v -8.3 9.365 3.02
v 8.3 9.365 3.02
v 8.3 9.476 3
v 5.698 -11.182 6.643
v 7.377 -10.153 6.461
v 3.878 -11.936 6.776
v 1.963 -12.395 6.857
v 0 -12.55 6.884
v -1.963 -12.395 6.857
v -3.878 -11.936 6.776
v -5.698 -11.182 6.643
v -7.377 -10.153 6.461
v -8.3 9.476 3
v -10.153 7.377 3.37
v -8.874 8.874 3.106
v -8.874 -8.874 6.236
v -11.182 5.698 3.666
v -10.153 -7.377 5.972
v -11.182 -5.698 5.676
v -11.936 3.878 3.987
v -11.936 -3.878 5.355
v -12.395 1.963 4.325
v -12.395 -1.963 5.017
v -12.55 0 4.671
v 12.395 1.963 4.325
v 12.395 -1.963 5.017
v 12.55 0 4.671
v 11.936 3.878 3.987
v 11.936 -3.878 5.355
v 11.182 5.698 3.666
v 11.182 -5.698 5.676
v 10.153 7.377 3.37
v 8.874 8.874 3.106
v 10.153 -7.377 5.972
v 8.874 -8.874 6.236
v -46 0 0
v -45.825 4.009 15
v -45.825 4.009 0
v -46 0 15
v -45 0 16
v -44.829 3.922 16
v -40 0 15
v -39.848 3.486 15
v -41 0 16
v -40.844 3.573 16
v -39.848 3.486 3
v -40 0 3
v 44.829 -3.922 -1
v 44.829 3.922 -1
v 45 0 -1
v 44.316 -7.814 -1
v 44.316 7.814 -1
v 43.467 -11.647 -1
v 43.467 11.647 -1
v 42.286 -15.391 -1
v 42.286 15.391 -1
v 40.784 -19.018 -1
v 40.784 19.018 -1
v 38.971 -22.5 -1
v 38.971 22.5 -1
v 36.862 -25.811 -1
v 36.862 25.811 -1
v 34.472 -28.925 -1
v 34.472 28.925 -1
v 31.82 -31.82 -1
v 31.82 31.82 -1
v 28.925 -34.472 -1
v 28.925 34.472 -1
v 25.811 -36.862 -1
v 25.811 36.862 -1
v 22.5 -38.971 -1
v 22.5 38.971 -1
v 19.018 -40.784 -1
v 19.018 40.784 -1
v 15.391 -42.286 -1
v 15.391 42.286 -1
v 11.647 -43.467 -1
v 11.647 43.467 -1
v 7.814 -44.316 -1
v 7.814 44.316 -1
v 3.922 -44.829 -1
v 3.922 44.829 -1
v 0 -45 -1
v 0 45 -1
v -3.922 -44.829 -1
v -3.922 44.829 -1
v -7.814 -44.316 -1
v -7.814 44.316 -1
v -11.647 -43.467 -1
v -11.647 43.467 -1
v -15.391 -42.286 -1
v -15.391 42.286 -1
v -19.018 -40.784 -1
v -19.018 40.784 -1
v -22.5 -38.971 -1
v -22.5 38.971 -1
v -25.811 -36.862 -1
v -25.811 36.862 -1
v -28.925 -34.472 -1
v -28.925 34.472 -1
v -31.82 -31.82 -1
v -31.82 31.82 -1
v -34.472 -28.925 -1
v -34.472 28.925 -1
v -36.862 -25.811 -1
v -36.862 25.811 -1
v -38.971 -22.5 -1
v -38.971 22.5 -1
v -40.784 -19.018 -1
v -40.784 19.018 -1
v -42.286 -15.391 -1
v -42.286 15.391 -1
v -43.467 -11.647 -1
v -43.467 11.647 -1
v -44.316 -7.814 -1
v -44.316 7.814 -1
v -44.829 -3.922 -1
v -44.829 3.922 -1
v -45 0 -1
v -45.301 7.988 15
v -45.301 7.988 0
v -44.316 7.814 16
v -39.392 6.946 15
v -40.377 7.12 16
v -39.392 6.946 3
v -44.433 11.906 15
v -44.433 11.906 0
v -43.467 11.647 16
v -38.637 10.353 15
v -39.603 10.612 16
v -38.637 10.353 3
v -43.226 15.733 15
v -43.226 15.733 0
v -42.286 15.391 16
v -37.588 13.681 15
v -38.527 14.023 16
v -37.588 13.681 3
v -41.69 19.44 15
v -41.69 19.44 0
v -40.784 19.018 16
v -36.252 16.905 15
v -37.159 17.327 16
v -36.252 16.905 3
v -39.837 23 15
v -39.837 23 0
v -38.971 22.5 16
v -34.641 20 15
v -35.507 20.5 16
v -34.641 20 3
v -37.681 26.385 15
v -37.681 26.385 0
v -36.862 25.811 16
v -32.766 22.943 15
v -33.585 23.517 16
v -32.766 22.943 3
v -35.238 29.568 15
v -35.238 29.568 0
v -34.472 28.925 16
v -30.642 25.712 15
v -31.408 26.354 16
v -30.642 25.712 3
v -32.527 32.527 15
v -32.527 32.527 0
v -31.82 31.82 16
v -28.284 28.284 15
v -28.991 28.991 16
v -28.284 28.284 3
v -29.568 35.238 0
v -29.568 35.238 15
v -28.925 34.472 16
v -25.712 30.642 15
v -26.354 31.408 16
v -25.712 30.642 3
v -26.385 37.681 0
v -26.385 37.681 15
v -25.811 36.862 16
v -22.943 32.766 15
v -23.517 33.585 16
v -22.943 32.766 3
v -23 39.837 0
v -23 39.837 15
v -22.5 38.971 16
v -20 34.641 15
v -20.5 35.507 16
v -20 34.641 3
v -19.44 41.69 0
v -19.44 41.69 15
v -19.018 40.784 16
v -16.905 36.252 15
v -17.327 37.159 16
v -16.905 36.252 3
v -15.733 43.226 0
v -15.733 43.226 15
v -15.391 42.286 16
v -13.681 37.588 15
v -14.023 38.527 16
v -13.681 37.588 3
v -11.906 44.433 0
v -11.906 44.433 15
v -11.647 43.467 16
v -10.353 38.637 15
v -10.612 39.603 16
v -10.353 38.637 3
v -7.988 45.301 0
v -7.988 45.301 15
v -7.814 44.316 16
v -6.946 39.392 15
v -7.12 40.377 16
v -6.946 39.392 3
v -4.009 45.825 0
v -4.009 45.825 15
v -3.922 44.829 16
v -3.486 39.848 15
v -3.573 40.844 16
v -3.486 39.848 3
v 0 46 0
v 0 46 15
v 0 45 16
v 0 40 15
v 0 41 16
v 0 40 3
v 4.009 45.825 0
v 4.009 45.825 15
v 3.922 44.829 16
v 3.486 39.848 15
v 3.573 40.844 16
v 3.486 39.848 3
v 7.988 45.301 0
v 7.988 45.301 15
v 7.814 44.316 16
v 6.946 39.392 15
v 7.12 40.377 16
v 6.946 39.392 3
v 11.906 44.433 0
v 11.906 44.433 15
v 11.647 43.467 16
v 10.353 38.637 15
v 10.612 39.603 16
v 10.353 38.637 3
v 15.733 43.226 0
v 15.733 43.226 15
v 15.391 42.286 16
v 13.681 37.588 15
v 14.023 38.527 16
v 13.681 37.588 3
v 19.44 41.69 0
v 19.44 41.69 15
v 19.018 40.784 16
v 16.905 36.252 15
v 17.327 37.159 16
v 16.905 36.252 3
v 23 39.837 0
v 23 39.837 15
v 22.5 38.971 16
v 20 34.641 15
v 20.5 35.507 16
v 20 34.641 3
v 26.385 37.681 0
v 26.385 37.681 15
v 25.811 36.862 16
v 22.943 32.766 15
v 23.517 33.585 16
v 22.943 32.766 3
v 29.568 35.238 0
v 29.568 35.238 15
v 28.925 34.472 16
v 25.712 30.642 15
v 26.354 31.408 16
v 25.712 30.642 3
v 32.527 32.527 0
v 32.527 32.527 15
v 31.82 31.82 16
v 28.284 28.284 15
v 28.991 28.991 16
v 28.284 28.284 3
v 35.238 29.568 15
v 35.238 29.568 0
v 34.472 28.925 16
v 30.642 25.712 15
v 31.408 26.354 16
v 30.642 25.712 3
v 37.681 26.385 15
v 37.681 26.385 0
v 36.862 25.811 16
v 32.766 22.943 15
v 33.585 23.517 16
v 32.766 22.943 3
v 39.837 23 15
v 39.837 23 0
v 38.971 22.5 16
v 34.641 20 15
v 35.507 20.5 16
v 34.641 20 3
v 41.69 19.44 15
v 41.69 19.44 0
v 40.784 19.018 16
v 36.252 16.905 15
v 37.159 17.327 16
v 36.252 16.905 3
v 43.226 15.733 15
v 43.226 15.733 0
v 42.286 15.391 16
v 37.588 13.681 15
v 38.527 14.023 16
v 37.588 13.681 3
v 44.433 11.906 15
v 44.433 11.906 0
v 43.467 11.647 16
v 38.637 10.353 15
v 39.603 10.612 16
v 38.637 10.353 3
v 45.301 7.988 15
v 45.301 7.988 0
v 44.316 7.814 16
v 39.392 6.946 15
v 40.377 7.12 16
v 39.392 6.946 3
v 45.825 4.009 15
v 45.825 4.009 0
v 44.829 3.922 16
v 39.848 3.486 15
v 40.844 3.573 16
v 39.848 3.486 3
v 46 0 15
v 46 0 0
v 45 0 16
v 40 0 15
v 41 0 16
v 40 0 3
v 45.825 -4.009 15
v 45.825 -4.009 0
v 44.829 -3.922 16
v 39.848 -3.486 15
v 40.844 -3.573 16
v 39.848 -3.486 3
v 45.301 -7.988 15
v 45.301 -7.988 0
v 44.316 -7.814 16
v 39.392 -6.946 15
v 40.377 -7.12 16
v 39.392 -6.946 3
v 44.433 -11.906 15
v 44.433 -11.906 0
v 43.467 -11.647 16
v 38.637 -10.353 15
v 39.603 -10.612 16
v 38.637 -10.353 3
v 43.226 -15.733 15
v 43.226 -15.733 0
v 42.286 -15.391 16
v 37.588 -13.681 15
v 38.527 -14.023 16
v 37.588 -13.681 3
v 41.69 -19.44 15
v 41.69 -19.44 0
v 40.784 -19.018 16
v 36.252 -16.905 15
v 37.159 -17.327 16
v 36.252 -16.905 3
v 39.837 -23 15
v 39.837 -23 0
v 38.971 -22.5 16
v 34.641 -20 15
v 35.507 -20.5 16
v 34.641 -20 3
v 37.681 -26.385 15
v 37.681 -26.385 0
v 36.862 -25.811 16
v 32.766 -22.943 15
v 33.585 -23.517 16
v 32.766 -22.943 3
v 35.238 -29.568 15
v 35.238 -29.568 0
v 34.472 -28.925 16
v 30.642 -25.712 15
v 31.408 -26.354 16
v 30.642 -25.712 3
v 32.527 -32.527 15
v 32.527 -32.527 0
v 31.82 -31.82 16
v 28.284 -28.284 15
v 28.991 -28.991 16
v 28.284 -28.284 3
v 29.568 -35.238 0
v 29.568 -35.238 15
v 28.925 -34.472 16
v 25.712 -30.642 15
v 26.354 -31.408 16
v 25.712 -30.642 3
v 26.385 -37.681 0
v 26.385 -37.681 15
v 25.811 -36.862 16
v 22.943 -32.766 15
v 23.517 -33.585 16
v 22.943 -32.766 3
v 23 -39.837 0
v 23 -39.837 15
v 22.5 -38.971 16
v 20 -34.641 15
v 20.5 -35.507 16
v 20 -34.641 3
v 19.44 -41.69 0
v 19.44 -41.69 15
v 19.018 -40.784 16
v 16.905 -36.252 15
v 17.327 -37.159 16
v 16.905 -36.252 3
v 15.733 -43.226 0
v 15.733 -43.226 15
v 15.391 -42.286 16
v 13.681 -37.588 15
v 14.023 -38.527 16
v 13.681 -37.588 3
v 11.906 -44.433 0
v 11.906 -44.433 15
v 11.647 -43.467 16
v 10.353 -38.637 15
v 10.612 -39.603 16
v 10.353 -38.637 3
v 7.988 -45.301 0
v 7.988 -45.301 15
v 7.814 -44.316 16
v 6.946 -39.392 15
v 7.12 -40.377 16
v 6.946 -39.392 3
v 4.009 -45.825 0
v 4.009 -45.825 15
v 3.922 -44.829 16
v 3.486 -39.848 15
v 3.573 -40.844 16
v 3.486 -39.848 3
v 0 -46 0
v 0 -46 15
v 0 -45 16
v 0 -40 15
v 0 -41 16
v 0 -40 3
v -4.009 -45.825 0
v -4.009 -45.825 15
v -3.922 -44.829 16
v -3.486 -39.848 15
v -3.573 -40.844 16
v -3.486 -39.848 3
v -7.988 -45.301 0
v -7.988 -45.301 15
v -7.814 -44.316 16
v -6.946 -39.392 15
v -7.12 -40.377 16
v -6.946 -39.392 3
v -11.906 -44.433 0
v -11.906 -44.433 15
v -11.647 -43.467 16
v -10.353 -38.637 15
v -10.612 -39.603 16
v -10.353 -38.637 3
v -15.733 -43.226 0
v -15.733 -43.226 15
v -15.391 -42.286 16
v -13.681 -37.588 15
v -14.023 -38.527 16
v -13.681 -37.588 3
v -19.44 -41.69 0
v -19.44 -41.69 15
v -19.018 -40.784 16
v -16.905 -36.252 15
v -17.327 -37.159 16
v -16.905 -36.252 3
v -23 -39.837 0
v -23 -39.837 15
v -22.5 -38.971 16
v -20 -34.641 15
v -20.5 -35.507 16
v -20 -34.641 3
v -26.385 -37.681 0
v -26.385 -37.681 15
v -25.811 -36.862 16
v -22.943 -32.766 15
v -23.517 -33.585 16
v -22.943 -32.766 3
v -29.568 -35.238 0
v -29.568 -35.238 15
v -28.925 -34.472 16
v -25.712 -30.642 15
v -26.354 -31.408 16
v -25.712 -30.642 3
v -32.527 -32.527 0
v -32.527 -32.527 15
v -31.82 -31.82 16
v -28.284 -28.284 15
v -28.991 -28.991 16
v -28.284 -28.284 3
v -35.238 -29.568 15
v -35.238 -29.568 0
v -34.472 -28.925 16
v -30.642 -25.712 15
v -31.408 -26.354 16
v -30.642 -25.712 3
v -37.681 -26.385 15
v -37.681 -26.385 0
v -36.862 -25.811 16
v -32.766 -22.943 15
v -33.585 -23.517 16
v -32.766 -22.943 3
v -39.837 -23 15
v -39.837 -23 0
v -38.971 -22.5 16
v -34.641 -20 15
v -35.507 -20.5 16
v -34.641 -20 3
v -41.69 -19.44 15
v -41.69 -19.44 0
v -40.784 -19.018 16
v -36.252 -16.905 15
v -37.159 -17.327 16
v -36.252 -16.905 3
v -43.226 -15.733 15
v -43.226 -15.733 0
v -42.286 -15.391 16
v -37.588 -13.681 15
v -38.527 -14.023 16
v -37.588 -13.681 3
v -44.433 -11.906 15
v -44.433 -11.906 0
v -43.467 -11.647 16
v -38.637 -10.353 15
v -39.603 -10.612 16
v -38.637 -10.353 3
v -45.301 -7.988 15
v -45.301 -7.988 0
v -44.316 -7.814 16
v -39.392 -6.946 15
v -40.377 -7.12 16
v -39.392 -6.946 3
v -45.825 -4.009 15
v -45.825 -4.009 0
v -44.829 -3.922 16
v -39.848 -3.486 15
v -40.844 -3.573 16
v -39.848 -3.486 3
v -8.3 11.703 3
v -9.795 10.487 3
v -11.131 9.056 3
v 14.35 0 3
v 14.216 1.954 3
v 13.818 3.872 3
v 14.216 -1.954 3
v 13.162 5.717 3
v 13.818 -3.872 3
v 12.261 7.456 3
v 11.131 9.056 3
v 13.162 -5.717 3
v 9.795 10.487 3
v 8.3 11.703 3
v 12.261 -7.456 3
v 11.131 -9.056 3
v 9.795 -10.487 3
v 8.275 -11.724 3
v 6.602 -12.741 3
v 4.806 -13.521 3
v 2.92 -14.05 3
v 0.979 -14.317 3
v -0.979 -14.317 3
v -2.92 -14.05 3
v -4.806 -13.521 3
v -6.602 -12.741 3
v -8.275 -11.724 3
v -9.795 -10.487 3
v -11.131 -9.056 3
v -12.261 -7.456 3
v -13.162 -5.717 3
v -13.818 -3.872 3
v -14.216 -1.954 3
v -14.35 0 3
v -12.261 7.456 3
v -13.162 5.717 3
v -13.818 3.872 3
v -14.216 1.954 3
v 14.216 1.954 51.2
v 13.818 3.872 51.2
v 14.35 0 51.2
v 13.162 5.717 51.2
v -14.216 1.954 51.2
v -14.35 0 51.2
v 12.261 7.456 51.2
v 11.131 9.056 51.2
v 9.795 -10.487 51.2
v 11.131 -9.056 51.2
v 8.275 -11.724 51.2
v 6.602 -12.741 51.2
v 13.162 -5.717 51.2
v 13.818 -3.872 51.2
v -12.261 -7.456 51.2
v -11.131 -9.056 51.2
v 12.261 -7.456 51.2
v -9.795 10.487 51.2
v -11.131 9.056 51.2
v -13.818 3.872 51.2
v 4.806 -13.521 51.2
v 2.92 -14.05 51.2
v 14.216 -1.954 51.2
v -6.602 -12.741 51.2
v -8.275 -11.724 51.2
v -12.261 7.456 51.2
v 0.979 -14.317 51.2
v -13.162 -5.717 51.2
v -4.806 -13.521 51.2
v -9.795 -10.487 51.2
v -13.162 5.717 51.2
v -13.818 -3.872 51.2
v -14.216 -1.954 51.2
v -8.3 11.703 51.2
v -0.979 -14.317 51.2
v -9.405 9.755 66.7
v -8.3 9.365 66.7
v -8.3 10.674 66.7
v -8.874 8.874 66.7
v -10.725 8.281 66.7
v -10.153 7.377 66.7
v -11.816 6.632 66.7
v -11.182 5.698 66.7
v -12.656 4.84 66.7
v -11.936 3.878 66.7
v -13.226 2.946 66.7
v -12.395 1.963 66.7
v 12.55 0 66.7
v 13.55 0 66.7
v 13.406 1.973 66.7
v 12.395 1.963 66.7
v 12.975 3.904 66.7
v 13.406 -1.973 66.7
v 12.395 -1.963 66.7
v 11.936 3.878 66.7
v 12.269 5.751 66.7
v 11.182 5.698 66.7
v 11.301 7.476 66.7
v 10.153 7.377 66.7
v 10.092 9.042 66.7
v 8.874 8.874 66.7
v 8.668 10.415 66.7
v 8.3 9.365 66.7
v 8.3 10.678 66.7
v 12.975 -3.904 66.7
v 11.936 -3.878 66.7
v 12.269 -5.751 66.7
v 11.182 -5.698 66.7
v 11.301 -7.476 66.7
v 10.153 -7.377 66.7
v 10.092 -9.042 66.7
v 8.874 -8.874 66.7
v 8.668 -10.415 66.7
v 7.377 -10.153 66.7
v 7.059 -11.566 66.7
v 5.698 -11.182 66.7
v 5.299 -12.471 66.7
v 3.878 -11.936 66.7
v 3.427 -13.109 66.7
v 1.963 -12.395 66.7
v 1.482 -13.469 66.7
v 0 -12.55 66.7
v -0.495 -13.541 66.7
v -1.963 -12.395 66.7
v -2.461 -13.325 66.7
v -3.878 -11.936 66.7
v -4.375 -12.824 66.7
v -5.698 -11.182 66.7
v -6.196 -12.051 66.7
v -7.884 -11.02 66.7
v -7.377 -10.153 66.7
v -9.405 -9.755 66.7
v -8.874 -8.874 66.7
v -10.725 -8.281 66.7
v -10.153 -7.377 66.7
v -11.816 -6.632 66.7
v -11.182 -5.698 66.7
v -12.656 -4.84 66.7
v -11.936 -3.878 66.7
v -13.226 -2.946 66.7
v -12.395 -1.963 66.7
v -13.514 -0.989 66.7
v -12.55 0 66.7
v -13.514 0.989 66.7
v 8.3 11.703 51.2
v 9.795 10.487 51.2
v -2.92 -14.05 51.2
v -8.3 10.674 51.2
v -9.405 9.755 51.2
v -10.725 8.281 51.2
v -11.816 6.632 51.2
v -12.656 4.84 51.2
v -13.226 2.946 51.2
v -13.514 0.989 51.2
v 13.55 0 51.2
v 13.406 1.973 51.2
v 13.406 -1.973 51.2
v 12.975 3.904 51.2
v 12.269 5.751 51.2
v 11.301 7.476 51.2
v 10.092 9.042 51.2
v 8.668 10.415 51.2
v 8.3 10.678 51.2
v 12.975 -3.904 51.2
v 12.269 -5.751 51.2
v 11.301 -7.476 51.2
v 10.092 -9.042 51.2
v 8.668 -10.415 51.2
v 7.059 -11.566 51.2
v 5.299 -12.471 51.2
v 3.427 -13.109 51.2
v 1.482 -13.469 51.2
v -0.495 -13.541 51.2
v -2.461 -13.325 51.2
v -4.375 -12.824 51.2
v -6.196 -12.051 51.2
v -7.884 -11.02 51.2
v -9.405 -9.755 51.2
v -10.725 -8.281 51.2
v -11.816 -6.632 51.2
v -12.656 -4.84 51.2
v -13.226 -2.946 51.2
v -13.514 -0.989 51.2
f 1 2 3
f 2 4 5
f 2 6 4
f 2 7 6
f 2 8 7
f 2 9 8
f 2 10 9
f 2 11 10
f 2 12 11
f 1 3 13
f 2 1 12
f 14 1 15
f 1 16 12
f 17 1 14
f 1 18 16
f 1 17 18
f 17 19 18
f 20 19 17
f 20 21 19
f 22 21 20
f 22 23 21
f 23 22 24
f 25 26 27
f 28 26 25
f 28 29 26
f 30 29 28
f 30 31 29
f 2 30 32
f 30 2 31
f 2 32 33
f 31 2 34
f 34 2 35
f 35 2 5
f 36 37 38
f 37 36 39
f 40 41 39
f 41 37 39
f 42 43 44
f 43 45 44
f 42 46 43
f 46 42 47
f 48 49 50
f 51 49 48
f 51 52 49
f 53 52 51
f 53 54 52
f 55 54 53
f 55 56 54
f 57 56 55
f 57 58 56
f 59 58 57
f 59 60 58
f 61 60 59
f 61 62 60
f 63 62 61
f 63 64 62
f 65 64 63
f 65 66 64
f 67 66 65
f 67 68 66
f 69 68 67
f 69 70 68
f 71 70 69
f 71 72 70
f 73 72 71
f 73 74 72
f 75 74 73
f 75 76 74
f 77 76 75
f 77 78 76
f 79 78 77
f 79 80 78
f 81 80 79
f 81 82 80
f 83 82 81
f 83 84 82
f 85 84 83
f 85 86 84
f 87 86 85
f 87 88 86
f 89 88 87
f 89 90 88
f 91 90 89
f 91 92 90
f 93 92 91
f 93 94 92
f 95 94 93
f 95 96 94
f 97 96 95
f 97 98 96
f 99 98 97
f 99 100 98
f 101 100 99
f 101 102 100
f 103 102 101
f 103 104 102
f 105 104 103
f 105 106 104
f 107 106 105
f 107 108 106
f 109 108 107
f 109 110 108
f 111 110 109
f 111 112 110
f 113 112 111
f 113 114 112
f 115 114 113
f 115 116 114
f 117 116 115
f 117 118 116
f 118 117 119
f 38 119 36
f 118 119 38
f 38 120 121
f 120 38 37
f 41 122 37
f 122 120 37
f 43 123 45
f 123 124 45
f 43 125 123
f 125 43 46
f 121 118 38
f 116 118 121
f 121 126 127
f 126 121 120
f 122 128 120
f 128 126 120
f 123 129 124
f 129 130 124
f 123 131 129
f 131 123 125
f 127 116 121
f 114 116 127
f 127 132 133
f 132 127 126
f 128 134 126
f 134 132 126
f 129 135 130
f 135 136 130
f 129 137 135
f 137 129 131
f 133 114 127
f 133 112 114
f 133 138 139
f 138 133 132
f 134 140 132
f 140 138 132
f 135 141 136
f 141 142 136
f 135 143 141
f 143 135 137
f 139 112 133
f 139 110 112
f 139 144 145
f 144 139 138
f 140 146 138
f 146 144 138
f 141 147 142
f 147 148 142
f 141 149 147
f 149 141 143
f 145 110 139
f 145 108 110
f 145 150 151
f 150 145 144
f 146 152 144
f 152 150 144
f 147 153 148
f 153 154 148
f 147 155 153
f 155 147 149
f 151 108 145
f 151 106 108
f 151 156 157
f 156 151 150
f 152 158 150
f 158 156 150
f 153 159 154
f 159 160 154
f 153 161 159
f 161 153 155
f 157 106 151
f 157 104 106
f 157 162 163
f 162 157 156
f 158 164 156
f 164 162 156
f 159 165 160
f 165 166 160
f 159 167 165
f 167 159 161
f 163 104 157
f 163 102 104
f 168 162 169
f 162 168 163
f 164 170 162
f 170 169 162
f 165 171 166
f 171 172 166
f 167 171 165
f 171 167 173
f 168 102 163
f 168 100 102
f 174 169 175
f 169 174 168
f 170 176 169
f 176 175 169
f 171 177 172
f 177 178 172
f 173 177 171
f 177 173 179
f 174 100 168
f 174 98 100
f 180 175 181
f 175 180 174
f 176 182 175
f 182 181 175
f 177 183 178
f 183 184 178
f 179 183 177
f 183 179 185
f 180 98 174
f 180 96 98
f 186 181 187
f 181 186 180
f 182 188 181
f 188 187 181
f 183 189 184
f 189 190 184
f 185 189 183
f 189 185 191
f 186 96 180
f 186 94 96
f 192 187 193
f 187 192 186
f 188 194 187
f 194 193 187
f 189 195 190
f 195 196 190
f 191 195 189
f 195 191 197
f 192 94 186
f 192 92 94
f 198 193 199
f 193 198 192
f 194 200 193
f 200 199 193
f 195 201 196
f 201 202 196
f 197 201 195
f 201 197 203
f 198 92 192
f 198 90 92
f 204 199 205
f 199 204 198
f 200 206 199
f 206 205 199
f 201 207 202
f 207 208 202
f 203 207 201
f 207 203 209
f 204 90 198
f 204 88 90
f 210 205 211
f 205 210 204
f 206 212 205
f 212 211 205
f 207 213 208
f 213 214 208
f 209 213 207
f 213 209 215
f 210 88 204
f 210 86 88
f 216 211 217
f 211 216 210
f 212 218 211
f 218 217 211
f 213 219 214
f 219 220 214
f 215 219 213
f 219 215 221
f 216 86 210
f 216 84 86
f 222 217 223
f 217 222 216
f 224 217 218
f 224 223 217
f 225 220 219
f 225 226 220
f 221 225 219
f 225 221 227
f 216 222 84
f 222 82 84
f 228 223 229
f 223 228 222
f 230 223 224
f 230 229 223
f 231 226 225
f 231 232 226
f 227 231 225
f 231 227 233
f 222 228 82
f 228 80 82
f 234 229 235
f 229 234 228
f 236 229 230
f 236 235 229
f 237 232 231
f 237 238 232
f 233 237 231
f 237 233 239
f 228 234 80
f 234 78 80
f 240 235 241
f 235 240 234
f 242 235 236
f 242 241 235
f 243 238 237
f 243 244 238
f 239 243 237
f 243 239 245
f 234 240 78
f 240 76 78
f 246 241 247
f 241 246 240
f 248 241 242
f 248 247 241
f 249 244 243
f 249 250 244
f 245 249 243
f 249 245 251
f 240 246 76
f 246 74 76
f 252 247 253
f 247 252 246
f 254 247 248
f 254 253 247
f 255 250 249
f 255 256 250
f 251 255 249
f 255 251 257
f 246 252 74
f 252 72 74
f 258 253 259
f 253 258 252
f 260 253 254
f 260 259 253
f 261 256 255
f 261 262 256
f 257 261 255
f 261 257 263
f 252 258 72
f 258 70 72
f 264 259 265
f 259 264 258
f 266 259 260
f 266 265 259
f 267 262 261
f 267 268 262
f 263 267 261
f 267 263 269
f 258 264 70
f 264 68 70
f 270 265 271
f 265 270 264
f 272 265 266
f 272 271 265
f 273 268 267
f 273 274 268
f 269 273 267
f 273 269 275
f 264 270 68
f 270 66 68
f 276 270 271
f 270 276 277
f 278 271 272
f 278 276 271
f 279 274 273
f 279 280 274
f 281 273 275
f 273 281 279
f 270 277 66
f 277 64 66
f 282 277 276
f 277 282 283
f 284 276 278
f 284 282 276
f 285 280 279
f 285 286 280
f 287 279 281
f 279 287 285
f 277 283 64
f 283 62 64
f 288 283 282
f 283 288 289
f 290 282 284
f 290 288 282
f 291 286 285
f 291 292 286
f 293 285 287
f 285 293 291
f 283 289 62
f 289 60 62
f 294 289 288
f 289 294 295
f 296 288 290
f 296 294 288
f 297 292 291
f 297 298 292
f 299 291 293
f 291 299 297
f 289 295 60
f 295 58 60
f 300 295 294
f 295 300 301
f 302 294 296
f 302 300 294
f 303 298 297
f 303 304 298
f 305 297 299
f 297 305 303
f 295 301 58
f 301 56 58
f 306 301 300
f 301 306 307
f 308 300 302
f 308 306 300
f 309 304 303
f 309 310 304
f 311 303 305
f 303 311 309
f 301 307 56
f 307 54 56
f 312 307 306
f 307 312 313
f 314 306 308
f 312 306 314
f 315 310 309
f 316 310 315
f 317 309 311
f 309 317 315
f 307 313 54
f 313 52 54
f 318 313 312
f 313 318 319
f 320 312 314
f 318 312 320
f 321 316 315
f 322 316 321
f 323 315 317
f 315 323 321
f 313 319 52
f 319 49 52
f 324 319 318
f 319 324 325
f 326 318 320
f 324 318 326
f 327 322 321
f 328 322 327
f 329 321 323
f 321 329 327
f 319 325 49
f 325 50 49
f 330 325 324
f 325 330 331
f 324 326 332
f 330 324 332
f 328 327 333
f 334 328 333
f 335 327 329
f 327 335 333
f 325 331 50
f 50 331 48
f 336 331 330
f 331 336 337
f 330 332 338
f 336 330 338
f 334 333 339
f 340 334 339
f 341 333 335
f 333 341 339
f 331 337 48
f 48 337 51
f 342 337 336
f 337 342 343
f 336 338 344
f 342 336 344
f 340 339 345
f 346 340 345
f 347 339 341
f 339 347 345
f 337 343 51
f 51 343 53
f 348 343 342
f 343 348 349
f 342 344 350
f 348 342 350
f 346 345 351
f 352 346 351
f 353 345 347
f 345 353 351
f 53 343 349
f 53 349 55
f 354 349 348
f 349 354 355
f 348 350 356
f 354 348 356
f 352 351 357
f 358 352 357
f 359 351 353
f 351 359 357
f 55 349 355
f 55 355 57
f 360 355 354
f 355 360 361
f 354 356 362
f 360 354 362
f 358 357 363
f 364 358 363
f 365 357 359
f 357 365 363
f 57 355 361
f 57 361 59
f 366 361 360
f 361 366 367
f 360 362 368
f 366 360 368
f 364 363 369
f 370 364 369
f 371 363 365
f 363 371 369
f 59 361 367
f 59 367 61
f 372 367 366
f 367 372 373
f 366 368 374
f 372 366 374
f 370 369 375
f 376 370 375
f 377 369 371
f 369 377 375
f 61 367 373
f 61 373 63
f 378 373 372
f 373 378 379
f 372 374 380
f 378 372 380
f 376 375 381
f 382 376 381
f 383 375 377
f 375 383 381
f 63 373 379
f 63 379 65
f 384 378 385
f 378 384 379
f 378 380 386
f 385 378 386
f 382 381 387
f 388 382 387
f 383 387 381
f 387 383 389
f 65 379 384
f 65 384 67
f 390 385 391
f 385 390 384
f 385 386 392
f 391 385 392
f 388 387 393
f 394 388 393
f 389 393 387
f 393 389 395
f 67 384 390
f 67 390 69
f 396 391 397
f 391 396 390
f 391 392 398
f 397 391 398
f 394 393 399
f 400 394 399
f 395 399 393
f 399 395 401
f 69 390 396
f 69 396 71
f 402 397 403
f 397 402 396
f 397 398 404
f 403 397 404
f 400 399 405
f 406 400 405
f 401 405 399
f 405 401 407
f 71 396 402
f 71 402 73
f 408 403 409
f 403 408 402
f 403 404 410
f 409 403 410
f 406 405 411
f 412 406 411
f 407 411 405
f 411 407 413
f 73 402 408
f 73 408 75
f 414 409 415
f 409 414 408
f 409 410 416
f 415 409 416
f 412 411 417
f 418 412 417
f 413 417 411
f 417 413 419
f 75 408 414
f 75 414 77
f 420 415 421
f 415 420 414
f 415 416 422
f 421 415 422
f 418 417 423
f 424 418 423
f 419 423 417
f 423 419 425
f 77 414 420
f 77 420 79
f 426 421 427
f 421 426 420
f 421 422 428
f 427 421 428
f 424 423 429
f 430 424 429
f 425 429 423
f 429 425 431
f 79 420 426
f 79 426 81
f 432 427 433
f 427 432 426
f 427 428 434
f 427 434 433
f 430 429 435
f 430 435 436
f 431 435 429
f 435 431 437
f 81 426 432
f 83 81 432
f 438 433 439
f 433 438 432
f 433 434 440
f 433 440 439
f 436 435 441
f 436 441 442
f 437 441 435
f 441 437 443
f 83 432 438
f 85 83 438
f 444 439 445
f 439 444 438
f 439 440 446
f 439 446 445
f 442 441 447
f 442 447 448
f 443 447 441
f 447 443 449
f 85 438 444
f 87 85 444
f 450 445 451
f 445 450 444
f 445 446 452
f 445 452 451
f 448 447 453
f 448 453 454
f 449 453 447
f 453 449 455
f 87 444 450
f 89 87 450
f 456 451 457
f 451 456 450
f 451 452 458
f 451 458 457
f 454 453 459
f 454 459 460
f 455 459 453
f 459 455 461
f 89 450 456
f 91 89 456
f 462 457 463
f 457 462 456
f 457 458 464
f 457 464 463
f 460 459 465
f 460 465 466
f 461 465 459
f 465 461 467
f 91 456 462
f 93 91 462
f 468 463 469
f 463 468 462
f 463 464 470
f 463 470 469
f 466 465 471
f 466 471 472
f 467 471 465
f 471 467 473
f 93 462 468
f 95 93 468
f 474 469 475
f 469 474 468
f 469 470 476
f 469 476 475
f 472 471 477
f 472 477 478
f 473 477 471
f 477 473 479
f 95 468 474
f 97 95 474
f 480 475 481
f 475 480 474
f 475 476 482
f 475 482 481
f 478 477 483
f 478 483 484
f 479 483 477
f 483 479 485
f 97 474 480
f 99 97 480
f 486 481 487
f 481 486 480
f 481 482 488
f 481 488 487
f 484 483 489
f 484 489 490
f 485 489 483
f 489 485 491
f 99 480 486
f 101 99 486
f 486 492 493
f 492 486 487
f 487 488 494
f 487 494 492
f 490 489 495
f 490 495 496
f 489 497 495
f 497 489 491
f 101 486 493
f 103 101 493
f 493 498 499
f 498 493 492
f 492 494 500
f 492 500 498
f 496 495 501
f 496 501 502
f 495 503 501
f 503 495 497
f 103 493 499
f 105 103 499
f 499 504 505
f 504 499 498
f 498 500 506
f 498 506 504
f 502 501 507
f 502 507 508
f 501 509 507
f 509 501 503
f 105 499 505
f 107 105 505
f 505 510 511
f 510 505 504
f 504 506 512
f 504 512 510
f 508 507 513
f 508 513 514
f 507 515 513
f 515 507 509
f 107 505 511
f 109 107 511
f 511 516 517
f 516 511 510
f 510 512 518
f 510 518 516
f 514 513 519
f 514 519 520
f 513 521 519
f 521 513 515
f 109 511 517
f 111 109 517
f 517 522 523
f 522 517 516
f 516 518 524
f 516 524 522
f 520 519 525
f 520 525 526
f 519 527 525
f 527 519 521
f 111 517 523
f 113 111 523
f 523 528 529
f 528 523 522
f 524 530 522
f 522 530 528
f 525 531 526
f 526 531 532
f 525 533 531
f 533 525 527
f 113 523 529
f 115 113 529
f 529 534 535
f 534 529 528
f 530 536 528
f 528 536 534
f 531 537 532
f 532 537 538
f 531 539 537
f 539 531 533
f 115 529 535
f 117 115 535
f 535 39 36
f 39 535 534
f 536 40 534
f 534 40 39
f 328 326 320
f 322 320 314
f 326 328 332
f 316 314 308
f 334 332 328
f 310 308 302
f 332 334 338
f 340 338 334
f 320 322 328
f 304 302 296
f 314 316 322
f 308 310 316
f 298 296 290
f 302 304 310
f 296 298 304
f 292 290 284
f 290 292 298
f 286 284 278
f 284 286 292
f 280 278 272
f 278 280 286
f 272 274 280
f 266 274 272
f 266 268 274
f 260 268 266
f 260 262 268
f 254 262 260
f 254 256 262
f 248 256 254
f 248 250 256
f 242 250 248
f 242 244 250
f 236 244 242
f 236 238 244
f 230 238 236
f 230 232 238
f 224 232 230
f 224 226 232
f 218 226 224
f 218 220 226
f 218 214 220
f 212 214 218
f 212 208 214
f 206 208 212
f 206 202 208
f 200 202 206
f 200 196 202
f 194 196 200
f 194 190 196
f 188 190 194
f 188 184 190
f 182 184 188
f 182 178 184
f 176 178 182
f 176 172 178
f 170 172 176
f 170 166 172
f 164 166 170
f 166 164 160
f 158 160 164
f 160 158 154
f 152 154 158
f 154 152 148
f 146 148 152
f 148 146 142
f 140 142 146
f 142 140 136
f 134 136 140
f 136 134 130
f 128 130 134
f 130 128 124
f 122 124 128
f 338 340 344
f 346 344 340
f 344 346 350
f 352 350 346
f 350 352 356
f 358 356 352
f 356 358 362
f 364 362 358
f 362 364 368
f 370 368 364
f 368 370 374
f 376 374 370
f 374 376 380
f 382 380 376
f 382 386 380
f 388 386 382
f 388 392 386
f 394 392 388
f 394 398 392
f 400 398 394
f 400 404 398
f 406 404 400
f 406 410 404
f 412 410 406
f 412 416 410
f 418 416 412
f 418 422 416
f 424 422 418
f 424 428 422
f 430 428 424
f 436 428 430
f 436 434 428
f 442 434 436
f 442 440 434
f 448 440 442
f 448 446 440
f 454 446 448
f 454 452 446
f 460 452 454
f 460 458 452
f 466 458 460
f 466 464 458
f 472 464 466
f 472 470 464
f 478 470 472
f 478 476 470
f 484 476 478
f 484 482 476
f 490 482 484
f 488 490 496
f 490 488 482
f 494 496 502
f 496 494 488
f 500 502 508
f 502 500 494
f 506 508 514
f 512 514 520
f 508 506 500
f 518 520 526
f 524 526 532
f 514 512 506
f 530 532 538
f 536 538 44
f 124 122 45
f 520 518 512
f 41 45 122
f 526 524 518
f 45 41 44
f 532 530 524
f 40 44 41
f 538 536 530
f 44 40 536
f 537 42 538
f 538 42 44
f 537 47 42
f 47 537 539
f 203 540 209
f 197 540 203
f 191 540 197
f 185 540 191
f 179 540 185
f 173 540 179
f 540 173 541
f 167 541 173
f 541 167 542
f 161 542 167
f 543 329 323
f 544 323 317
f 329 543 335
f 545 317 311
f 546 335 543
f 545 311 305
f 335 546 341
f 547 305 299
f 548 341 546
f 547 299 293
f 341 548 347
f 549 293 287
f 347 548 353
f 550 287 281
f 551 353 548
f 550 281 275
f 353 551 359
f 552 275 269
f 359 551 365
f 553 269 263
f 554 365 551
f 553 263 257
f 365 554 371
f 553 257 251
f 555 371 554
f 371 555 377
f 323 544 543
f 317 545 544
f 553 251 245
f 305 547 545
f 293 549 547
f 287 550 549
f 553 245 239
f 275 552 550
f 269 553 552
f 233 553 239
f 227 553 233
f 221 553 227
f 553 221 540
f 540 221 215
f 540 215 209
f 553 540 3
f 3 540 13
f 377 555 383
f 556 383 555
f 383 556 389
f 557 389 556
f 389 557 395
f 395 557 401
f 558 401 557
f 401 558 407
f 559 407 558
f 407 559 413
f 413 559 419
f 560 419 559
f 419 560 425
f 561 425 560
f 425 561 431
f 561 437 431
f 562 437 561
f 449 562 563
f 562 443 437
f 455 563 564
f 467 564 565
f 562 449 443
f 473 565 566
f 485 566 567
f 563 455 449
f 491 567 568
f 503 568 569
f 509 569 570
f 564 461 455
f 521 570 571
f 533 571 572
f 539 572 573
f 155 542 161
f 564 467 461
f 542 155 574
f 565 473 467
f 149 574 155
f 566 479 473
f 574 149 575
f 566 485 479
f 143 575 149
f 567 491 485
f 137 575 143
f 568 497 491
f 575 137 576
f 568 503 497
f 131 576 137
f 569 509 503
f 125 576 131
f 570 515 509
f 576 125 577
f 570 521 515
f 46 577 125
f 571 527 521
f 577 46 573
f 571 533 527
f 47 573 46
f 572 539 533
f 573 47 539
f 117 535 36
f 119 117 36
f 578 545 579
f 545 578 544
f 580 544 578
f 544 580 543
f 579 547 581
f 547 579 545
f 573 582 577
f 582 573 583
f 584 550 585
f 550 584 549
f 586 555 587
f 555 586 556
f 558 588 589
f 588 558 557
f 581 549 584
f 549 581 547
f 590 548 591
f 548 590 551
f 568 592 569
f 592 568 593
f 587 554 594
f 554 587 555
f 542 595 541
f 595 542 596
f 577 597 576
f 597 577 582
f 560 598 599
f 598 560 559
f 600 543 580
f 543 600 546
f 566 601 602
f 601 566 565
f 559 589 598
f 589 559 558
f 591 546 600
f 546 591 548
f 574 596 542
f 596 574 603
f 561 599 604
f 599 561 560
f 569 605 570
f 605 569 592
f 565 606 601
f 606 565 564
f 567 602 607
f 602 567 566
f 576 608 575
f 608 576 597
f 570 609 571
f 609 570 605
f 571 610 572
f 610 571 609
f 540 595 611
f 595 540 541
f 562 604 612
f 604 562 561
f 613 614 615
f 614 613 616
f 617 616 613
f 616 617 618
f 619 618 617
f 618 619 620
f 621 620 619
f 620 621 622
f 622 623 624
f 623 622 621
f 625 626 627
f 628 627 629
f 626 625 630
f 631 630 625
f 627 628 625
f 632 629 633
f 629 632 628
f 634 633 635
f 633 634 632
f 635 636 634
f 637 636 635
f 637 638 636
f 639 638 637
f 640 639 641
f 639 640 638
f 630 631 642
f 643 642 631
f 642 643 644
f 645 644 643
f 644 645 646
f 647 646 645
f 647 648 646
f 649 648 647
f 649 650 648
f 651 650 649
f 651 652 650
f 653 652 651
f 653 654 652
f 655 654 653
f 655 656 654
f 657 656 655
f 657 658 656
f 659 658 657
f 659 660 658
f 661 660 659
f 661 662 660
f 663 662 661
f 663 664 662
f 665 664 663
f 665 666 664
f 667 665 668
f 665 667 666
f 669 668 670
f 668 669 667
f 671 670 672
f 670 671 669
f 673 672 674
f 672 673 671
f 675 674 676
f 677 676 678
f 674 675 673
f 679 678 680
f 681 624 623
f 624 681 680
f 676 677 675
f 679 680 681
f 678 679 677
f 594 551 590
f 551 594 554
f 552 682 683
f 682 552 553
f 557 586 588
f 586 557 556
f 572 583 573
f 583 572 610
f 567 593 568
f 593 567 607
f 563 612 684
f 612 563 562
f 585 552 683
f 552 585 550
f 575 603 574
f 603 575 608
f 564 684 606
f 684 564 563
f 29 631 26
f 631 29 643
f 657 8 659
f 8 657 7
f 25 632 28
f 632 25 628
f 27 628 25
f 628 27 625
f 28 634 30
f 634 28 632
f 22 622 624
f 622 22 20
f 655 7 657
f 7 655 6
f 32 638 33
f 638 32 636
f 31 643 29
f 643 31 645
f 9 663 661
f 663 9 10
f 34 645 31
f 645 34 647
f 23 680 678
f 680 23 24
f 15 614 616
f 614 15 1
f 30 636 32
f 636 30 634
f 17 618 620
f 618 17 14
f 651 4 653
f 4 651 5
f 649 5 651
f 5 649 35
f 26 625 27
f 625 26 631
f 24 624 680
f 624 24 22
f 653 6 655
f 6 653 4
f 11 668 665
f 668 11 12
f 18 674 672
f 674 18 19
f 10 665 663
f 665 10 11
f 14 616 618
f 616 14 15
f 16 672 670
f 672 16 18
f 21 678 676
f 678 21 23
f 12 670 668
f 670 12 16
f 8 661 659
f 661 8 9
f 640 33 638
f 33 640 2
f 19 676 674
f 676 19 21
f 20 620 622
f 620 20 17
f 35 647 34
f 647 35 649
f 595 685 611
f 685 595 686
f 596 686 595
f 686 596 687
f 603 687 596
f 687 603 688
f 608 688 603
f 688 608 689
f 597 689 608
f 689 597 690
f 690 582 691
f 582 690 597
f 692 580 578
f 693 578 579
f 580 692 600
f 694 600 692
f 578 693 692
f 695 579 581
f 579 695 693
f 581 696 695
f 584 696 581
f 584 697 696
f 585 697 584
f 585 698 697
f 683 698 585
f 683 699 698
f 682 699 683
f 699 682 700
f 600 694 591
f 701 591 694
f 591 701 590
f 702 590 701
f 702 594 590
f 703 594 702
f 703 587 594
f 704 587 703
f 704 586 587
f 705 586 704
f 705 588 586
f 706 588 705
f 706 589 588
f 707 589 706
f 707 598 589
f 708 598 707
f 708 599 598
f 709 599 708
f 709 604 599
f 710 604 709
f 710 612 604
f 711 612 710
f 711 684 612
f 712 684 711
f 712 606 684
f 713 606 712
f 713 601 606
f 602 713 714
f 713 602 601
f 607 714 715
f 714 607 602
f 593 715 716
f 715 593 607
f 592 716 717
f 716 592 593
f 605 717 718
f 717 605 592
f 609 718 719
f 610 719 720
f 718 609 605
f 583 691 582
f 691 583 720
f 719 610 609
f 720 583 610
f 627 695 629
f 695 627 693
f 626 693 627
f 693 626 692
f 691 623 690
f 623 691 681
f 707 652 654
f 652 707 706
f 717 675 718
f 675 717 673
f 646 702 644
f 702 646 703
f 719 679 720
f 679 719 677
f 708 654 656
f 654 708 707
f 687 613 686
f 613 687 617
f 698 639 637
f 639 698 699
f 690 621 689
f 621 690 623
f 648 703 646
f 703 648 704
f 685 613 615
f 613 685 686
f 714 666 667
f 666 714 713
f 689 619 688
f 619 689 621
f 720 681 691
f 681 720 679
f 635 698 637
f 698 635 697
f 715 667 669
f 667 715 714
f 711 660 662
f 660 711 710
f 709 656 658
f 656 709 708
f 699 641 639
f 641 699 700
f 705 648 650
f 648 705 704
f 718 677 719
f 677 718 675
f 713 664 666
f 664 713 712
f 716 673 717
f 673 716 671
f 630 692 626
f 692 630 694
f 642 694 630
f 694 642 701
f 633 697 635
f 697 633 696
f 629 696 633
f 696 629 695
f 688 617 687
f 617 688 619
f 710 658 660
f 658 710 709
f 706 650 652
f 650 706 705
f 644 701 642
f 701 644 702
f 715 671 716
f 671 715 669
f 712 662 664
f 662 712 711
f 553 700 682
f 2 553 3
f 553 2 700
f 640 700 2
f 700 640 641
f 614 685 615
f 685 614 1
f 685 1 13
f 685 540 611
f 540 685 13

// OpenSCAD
$fa = 5;
maleDiameter= 27.1;
femaleDiameter = 26.7; // Increased by 0.1
wallWidth = 2;
bodyLength = 51.2;
totalLength = 66.7;
slotWidth = 2.5;
slotLength = 24;
// Actually rendered 16 as 15.4 which is too small
marbleWidth = 16.6;

module tube(outerDiameter, innerDiameter, height) {
        difference() {
            translate([0,0,height/2])
            cylinder(h = height, d = outerDiameter, center = true);
            translate([0,0,(height+0.1)/2])
            cylinder(h = height+0.2, d = innerDiameter, center = true);
        }
}

module marbleTube() {
    difference() {
        tube(femaleDiameter+wallWidth,maleDiameter-wallWidth,totalLength);
        translate([0,0,bodyLength])
            tube(maleDiameter+2*wallWidth,maleDiameter,totalLength-bodyLength+0.1);
        translate([0,0,-0.1])
            tube(femaleDiameter,0,totalLength-bodyLength+0.1);
        translate([0,maleDiameter/2,totalLength-slotLength/2])
            cube([slotWidth,maleDiameter,slotLength+0.1],center=true);
    }
}

module marbleBaseTube() {
    difference() {
        tube(femaleDiameter+wallWidth,maleDiameter-wallWidth,totalLength);
        translate([0,0,bodyLength])
            tube(maleDiameter+2*wallWidth,maleDiameter,totalLength-bodyLength+0.1);
        translate([0,maleDiameter/2,totalLength/2])
            cube([marbleWidth,maleDiameter,totalLength+0.1],center=true);
    }
}

rimThickness = 4;
rimHeight = 15;
catchRadius = 45;
rampHeight = 5;

module marbleBaseCatch() {
    rotate_extrude()
        difference() {
            offset(r=wallWidth/2)
                polygon([[0,0],
                        [catchRadius,0],
                        [catchRadius,rimHeight],
                        [catchRadius-rimThickness,rimHeight],
                        [catchRadius-rimThickness,wallWidth],
                        [0,wallWidth]]);
            // Trim off the offset along the axis
            polygon([[0,wallWidth+rimThickness],
                     [-wallWidth,wallWidth],
                     [-wallWidth,-wallWidth],
                     [0,-wallWidth]]);
        }
    // Put a ramp at the bottom to get the marbles out.
    difference() {
        translate([0,0,rampHeight/2+wallWidth])
            cylinder(h = rampHeight, d = femaleDiameter, center = true);
        rotate([-10,0,0])
            translate([0,0,5*wallWidth-0.4])
                cube([catchRadius,catchRadius,2*rampHeight],center = true);
    }
}

marbleBaseCatch();
marbleBaseTube();
